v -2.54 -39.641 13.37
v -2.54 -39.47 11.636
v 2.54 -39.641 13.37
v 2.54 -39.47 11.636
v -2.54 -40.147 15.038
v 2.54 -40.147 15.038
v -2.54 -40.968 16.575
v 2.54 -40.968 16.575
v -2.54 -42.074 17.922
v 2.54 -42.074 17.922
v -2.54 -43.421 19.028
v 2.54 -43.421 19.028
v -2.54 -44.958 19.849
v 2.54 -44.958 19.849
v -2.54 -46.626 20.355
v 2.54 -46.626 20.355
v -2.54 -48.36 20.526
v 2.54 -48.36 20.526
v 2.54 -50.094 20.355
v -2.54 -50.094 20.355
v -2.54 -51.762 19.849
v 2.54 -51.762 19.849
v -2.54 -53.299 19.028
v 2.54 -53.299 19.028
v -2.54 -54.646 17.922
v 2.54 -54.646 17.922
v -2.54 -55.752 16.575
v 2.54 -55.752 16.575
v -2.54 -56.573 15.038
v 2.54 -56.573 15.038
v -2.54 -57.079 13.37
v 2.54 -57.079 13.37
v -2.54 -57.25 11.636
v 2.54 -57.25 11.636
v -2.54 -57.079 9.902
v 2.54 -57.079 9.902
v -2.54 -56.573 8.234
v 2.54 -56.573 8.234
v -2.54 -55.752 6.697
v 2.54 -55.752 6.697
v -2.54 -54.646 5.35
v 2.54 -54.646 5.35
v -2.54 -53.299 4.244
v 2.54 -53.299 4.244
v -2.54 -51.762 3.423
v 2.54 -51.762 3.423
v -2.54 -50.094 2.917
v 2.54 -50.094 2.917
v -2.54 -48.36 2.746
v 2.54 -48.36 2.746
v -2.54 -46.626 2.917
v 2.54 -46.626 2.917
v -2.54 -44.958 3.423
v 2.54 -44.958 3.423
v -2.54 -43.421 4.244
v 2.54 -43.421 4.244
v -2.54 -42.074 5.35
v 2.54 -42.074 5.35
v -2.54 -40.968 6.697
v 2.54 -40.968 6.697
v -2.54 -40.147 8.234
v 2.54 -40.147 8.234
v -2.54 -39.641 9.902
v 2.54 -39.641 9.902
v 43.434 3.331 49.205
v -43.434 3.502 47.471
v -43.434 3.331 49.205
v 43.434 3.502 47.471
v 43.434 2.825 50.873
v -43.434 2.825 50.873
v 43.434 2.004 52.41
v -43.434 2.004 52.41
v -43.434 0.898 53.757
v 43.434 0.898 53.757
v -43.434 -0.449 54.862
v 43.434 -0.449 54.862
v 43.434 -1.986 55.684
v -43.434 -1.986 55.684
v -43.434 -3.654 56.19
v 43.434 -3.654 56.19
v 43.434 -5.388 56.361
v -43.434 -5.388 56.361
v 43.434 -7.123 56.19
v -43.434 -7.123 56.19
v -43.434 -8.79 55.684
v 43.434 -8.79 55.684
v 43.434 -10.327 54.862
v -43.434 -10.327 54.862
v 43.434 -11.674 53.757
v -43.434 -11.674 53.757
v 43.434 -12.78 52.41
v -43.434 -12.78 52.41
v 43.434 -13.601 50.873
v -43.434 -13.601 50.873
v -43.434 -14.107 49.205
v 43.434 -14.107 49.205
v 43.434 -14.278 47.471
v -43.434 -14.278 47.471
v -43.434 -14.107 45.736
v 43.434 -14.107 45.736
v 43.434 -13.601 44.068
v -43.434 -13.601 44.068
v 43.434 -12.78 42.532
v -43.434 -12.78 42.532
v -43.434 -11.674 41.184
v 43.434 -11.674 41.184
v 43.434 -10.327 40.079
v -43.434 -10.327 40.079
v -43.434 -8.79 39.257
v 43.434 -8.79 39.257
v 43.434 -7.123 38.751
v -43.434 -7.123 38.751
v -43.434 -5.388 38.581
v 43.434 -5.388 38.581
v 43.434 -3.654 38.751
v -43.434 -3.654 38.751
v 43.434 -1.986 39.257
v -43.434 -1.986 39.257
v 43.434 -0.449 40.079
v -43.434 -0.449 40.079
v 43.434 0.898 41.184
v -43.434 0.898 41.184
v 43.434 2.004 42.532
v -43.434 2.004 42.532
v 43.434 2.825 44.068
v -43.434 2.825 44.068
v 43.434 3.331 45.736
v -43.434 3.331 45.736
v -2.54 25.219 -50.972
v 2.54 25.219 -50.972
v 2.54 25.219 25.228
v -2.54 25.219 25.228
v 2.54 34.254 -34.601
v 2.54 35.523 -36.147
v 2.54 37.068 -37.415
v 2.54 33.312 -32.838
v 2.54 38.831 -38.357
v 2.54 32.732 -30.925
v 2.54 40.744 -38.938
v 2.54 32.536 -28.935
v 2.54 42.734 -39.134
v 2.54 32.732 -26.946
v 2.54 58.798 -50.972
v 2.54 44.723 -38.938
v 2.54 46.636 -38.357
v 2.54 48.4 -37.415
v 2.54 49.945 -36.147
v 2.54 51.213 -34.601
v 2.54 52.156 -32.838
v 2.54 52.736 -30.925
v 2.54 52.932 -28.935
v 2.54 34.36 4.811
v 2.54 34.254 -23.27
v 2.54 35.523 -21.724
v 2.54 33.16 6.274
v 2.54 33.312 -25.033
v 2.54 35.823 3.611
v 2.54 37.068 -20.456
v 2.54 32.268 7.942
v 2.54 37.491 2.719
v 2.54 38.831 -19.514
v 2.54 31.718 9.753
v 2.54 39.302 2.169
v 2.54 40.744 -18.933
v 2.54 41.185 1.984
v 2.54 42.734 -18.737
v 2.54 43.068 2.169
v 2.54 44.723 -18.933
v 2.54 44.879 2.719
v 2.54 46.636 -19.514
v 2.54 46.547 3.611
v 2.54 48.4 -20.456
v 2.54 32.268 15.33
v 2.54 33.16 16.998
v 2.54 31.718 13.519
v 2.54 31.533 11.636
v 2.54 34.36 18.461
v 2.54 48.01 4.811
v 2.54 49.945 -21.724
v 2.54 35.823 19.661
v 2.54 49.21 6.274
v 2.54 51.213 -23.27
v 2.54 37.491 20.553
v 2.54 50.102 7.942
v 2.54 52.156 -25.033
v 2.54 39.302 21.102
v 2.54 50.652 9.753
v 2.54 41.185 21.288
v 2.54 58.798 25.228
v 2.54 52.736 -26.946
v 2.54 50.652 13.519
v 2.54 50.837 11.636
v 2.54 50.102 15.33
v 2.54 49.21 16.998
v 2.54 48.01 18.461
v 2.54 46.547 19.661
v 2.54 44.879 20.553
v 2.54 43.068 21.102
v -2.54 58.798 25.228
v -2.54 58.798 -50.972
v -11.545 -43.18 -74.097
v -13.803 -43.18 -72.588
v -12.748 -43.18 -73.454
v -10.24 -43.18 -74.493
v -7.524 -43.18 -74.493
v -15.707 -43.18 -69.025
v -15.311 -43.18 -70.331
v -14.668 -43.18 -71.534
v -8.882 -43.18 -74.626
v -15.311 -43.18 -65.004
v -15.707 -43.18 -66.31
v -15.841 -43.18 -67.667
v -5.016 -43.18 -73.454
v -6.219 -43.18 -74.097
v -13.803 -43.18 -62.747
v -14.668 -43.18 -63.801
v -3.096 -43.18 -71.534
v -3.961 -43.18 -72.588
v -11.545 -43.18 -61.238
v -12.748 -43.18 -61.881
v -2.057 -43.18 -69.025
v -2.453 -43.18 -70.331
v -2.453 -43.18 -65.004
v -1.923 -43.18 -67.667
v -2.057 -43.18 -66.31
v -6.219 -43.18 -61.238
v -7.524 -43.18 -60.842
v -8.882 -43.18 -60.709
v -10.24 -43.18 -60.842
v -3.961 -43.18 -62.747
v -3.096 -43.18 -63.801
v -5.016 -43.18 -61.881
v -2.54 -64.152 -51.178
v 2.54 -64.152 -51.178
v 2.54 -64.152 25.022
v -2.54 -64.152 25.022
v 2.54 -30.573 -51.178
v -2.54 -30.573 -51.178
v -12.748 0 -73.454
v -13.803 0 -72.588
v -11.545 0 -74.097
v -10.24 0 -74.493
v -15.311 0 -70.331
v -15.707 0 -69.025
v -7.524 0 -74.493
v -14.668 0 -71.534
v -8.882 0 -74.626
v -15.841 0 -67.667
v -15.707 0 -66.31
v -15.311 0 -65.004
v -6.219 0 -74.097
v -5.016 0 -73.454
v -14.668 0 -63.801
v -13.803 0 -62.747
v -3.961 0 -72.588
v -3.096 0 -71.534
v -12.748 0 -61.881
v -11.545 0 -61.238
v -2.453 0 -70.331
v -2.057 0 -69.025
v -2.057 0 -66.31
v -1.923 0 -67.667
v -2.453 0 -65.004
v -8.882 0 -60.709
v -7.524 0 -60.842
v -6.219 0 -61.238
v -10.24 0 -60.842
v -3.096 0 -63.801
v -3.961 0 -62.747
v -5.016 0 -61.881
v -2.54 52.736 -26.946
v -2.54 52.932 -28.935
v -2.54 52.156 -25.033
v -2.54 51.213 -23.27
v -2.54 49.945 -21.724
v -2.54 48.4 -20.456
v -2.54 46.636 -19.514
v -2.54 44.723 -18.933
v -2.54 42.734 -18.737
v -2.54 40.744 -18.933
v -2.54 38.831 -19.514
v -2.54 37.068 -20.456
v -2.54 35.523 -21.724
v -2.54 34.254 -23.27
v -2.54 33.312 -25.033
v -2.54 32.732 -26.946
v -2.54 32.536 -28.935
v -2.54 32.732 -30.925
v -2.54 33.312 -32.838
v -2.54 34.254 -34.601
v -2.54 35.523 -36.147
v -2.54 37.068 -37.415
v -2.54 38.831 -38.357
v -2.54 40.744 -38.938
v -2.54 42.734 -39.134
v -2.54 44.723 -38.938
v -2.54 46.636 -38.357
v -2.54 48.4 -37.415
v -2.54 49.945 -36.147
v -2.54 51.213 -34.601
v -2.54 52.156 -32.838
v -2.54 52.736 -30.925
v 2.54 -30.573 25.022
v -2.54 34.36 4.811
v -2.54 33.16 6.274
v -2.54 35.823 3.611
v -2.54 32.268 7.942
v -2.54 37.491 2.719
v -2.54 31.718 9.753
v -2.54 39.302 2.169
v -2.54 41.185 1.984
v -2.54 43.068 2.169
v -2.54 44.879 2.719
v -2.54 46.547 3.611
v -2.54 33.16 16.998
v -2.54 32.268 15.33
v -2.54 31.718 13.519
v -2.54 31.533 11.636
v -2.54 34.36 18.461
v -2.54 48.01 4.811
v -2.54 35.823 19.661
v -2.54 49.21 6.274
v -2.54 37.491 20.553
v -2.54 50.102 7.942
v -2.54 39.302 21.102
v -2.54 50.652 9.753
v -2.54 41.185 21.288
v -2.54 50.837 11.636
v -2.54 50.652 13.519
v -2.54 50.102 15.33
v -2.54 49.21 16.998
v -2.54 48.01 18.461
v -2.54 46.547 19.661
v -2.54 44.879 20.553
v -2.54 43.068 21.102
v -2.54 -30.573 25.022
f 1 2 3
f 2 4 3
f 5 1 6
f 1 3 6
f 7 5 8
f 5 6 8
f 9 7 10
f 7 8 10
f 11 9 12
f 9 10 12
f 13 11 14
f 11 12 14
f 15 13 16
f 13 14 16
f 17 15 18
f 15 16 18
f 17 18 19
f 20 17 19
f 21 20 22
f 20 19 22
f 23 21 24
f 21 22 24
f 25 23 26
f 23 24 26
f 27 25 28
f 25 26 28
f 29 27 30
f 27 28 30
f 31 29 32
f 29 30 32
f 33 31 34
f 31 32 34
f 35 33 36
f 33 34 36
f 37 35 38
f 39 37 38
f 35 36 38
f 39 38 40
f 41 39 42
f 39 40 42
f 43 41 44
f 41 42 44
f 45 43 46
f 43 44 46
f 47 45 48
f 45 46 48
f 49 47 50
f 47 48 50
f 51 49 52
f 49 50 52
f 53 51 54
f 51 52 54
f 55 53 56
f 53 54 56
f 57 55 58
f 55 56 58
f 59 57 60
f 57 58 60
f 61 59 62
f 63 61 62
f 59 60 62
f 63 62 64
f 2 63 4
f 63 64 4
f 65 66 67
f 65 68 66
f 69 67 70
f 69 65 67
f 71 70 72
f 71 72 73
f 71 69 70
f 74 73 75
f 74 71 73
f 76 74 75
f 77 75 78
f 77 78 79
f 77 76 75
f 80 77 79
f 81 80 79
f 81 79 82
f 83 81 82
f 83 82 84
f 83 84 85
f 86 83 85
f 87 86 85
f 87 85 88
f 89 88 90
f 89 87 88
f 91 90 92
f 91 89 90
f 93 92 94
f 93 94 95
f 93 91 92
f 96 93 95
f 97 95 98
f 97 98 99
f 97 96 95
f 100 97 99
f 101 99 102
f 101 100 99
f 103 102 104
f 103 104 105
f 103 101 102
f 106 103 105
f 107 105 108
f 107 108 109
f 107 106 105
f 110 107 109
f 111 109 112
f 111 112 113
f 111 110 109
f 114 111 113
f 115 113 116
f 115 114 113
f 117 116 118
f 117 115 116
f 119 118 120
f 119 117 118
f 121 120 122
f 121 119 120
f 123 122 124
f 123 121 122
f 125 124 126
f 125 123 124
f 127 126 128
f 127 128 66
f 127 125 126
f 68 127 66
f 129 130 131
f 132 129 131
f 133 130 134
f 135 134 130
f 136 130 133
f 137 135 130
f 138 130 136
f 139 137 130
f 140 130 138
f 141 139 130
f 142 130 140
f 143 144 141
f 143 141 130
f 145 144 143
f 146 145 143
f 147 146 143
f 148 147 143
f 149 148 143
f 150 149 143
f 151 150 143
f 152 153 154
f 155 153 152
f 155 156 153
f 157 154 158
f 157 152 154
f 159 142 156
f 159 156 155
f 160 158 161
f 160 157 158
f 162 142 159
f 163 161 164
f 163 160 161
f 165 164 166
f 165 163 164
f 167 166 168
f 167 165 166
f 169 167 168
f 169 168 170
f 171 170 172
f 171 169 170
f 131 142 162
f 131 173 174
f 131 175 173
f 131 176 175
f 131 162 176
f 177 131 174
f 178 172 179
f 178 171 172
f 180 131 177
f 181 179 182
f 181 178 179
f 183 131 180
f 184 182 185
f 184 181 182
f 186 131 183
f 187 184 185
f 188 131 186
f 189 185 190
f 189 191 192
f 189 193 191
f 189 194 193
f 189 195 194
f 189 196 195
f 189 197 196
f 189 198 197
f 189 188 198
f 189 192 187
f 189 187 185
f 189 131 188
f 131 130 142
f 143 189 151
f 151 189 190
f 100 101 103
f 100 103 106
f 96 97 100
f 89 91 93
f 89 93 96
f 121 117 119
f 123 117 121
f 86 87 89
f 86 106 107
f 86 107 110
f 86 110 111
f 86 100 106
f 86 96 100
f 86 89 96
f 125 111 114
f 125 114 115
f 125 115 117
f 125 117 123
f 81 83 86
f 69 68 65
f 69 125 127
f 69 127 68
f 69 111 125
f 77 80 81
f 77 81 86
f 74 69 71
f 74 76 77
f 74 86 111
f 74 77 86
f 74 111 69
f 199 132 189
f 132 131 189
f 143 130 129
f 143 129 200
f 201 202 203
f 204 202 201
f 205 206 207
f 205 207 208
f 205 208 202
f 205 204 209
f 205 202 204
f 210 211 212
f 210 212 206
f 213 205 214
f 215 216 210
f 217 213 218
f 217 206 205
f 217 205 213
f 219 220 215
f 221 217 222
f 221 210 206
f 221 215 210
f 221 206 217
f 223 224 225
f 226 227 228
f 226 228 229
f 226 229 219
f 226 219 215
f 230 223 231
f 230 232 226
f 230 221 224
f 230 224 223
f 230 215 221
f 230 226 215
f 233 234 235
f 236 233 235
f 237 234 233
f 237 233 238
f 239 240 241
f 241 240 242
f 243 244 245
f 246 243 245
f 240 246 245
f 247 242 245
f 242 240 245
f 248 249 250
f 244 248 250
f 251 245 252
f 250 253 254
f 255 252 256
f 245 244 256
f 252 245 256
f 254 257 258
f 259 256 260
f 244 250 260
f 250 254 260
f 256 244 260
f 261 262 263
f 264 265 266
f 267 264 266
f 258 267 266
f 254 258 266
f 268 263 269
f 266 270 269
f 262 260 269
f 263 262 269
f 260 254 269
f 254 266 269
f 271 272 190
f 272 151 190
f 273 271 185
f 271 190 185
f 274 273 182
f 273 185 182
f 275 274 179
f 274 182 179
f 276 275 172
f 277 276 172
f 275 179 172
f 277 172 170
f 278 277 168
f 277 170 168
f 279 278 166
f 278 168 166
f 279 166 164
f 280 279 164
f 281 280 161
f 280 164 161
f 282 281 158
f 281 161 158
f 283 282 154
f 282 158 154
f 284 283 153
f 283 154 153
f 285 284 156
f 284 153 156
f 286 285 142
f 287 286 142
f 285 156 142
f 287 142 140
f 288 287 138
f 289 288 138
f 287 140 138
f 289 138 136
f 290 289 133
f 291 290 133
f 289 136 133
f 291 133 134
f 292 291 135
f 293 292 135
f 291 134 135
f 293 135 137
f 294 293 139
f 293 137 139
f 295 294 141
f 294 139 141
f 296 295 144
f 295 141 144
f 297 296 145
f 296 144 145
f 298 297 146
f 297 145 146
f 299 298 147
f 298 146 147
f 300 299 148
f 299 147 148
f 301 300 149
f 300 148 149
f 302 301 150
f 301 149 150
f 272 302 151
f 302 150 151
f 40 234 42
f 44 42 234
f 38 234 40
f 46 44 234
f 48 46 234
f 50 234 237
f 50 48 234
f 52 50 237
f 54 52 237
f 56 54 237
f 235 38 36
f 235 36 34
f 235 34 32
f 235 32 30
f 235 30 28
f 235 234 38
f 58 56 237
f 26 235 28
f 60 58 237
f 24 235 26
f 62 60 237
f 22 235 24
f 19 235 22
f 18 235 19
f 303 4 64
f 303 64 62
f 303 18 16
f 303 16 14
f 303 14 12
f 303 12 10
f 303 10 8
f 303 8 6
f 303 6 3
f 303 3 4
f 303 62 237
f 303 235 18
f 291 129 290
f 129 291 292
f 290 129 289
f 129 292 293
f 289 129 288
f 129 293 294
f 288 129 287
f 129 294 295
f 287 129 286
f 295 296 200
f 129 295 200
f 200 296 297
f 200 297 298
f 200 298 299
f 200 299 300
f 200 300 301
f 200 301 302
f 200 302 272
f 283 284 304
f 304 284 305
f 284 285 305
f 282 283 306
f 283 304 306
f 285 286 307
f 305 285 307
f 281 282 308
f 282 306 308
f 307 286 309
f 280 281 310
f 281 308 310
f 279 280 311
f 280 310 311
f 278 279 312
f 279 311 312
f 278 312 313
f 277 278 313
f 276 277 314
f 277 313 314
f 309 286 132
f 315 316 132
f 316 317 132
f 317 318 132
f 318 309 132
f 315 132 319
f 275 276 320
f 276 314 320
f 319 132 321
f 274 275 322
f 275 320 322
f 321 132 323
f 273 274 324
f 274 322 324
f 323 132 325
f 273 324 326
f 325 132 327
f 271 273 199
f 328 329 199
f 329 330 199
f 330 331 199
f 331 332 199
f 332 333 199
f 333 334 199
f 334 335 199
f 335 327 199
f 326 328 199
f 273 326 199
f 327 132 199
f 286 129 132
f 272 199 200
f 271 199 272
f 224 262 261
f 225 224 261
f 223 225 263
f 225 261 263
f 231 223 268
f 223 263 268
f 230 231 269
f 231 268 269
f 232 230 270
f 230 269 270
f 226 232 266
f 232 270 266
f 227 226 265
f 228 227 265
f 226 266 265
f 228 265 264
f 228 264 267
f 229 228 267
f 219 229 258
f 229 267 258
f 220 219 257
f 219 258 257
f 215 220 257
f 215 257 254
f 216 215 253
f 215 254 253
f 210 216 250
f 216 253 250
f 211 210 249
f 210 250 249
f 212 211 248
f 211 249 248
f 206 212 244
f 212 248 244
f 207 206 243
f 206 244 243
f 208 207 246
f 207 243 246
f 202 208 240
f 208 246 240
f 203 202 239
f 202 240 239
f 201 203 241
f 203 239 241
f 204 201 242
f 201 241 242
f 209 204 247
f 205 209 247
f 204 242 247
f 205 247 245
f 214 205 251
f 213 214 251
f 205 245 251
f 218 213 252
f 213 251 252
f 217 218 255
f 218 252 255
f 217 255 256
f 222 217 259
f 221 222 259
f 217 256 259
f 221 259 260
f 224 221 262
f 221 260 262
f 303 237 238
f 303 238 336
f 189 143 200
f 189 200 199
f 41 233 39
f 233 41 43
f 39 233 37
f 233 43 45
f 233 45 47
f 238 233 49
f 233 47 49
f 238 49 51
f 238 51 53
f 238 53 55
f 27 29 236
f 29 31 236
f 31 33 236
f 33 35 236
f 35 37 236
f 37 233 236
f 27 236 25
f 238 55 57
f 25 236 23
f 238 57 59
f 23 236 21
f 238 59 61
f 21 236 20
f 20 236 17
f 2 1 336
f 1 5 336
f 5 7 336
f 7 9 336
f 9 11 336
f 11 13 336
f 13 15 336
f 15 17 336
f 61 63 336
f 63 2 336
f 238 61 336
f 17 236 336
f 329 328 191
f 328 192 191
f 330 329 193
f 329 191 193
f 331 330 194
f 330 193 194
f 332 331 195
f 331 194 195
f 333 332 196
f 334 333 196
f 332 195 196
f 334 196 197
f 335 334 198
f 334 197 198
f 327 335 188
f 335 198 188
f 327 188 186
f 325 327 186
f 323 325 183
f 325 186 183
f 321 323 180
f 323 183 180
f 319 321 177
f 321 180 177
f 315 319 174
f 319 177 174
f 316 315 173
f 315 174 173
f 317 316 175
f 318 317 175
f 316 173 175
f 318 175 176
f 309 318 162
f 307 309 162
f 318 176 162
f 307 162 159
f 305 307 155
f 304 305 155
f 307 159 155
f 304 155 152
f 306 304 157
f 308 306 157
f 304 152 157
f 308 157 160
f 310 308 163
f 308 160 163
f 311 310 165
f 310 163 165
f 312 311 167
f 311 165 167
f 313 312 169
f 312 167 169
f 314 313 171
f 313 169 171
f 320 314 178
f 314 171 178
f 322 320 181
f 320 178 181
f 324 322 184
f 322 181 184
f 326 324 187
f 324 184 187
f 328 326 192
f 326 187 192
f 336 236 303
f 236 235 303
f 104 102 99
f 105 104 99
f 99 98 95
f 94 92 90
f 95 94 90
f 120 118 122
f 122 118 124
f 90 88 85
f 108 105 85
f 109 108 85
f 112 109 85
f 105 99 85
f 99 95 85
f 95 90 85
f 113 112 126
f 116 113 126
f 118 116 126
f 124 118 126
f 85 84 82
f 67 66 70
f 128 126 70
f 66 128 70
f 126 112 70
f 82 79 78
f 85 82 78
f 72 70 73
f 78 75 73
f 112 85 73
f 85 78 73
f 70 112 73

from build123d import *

# Parameters (mm, degrees)
F0_W     = 33.5788
F0_H     = 76.2
F1_DEPTH = 2.54
F0_R     = 8.89
F2_DEPTH = 43.434
F3_R     = 8.89
F3_R_2   = 9.652
F4_DEPTH = 21.59
F5_DEPTH = 12.7
F6_R     = 10.1981
F7_DEPTH = 12.7
F8_R     = 6.9589762649
F9_DEPTH = 43.18


with BuildPart() as f1:
    # F0 (on Right) → F1 (new body, symmetric)
    with BuildSketch(Plane.YZ):
        with Locations((-47.3627662474, -13.0775650084)):
            Rectangle(F0_W, F0_H)
    extrude(amount=F1_DEPTH, both=True)


with BuildPart() as f1b:
    # F0 (on Right) → F1, piece 2 (new body, symmetric)
    with BuildSketch(Plane.YZ):
        with Locations((42.0081718081, -12.8716225684)):
            Rectangle(F0_W, F0_H)
    extrude(amount=F1_DEPTH, both=True)


with BuildPart() as f2:
    # F0 (on Right) → F2 (new body, symmetric)
    with BuildSketch(Plane.YZ):
        with Locations((-5.388148129, 47.4705435336)):
            Circle(F0_R)
    extrude(amount=F2_DEPTH, both=True)


with BuildPart() as f4_tool:
    # F3 (on Right) → F4 (new body, symmetric)
    with BuildSketch(Plane.YZ):
        with Locations((-48.3599044383, 11.6359470412)):
            Circle(F3_R)
        with Locations((41.1850363016, 11.6359470412)):
            Circle(F3_R_2)
    extrude(amount=F4_DEPTH, both=True)


with BuildPart() as f1_1:
    add(f1.part)

    # F4: cut by f4_tool
    add(f4_tool.part, mode=Mode.SUBTRACT)

    # F3 (on Right) → F5 (cut, symmetric)
    with BuildSketch(Plane.YZ):
        with Locations((-48.3599044383, 11.6359470412)):
            Circle(F3_R)
        with Locations((41.1850363016, 11.6359470412)):
            Circle(F3_R_2)
    extrude(amount=F5_DEPTH, both=True, mode=Mode.SUBTRACT)


with BuildPart() as f1b_1:
    add(f1b.part)

    # F4: cut by f4_tool
    add(f4_tool.part, mode=Mode.SUBTRACT)

    # F6 (on Right) → F7 (cut, symmetric)
    with BuildSketch(Plane.YZ):
        with Locations((42.733784765, -28.935406357)):
            Circle(F6_R)
    extrude(amount=F7_DEPTH, both=True, mode=Mode.SUBTRACT)


with BuildPart() as f9:
    # F8 (on Front) → F9 (new body)
    with BuildSketch(Plane.XZ):
        with Locations((-8.8820308447, -67.667491734)):
            Circle(F8_R)
    extrude(amount=F9_DEPTH)


solid = Compound([f2.part, f1_1.part, f1b_1.part, f9.part])
